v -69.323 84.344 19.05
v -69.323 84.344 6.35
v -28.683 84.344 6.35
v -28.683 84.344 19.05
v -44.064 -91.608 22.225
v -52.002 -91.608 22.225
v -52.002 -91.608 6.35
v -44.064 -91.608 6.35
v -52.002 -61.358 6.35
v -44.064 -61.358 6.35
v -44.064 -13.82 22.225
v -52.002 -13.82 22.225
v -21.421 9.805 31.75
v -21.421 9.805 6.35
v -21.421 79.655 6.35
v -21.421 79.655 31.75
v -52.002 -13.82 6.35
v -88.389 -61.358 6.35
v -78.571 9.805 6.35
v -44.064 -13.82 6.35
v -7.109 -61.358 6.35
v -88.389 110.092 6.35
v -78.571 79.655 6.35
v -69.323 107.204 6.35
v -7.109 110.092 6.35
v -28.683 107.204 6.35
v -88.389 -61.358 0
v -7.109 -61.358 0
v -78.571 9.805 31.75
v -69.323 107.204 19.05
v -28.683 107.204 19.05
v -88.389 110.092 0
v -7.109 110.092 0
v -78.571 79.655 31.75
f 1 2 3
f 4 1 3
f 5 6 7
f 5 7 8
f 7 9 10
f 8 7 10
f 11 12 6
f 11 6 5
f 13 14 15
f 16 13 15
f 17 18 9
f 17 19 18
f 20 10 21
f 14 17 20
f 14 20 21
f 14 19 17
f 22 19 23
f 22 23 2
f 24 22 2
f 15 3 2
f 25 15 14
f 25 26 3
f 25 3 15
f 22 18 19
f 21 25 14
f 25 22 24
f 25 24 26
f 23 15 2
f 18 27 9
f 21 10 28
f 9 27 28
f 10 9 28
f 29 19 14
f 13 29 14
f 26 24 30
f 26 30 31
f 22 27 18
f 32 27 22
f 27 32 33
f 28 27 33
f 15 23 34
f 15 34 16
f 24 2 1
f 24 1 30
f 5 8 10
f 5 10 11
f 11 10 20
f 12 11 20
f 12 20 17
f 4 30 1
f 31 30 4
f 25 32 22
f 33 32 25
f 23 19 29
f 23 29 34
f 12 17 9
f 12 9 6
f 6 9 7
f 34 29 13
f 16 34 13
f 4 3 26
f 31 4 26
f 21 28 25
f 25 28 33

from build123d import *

# Parameters (mm, degrees)
F0_W     = 81.28
F0_H     = 171.45
F1_DEPTH = 6.35
F2_W     = 57.15
F2_H     = 69.85
F3_DEPTH = 25.4
F4_W     = 40.64
F4_H     = 22.86
F5_DEPTH = 12.7
F6_W     = 4.938572
F6_H     = 47.53778
F6_W_2   = 2.998928
F7_DEPTH = 15.875


with BuildPart() as f1:
    # F0 (on Top) → F1 (new body)
    with BuildSketch(Plane.XY):
        with Locations((-47.749023, 24.367116)):
            Rectangle(F0_W, F0_H)
    extrude(amount=F1_DEPTH)

    # F2 (on face) → F3 (join)
    with BuildSketch(Plane.XY.offset(6.35)):
        with Locations((-49.99557, 44.730341)):
            Rectangle(F2_W, F2_H)
    extrude(amount=F3_DEPTH)

    # F4 (on face) → F5 (join)
    with BuildSketch(Plane.XY.offset(6.35)):
        with Locations((-49.00288, 95.77399)):
            Rectangle(F4_W, F4_H)
    extrude(amount=F5_DEPTH)

    # F6 (on face) → F7 (join)
    with BuildSketch(Plane.XY.offset(6.35)):
        Polygon((-49.00288, -13.820104), (-52.001808, -13.820104), (-52.001808, -91.607604), (-44.064308, -91.607604), (-44.064308, -13.820104), align=None)
        with Locations((-46.533594, -37.588994)):
            Rectangle(F6_W, F6_H)
        with Locations((-50.502344, -37.588994)):
            Rectangle(F6_W_2, F6_H)
    extrude(amount=F7_DEPTH)


solid = f1.part
